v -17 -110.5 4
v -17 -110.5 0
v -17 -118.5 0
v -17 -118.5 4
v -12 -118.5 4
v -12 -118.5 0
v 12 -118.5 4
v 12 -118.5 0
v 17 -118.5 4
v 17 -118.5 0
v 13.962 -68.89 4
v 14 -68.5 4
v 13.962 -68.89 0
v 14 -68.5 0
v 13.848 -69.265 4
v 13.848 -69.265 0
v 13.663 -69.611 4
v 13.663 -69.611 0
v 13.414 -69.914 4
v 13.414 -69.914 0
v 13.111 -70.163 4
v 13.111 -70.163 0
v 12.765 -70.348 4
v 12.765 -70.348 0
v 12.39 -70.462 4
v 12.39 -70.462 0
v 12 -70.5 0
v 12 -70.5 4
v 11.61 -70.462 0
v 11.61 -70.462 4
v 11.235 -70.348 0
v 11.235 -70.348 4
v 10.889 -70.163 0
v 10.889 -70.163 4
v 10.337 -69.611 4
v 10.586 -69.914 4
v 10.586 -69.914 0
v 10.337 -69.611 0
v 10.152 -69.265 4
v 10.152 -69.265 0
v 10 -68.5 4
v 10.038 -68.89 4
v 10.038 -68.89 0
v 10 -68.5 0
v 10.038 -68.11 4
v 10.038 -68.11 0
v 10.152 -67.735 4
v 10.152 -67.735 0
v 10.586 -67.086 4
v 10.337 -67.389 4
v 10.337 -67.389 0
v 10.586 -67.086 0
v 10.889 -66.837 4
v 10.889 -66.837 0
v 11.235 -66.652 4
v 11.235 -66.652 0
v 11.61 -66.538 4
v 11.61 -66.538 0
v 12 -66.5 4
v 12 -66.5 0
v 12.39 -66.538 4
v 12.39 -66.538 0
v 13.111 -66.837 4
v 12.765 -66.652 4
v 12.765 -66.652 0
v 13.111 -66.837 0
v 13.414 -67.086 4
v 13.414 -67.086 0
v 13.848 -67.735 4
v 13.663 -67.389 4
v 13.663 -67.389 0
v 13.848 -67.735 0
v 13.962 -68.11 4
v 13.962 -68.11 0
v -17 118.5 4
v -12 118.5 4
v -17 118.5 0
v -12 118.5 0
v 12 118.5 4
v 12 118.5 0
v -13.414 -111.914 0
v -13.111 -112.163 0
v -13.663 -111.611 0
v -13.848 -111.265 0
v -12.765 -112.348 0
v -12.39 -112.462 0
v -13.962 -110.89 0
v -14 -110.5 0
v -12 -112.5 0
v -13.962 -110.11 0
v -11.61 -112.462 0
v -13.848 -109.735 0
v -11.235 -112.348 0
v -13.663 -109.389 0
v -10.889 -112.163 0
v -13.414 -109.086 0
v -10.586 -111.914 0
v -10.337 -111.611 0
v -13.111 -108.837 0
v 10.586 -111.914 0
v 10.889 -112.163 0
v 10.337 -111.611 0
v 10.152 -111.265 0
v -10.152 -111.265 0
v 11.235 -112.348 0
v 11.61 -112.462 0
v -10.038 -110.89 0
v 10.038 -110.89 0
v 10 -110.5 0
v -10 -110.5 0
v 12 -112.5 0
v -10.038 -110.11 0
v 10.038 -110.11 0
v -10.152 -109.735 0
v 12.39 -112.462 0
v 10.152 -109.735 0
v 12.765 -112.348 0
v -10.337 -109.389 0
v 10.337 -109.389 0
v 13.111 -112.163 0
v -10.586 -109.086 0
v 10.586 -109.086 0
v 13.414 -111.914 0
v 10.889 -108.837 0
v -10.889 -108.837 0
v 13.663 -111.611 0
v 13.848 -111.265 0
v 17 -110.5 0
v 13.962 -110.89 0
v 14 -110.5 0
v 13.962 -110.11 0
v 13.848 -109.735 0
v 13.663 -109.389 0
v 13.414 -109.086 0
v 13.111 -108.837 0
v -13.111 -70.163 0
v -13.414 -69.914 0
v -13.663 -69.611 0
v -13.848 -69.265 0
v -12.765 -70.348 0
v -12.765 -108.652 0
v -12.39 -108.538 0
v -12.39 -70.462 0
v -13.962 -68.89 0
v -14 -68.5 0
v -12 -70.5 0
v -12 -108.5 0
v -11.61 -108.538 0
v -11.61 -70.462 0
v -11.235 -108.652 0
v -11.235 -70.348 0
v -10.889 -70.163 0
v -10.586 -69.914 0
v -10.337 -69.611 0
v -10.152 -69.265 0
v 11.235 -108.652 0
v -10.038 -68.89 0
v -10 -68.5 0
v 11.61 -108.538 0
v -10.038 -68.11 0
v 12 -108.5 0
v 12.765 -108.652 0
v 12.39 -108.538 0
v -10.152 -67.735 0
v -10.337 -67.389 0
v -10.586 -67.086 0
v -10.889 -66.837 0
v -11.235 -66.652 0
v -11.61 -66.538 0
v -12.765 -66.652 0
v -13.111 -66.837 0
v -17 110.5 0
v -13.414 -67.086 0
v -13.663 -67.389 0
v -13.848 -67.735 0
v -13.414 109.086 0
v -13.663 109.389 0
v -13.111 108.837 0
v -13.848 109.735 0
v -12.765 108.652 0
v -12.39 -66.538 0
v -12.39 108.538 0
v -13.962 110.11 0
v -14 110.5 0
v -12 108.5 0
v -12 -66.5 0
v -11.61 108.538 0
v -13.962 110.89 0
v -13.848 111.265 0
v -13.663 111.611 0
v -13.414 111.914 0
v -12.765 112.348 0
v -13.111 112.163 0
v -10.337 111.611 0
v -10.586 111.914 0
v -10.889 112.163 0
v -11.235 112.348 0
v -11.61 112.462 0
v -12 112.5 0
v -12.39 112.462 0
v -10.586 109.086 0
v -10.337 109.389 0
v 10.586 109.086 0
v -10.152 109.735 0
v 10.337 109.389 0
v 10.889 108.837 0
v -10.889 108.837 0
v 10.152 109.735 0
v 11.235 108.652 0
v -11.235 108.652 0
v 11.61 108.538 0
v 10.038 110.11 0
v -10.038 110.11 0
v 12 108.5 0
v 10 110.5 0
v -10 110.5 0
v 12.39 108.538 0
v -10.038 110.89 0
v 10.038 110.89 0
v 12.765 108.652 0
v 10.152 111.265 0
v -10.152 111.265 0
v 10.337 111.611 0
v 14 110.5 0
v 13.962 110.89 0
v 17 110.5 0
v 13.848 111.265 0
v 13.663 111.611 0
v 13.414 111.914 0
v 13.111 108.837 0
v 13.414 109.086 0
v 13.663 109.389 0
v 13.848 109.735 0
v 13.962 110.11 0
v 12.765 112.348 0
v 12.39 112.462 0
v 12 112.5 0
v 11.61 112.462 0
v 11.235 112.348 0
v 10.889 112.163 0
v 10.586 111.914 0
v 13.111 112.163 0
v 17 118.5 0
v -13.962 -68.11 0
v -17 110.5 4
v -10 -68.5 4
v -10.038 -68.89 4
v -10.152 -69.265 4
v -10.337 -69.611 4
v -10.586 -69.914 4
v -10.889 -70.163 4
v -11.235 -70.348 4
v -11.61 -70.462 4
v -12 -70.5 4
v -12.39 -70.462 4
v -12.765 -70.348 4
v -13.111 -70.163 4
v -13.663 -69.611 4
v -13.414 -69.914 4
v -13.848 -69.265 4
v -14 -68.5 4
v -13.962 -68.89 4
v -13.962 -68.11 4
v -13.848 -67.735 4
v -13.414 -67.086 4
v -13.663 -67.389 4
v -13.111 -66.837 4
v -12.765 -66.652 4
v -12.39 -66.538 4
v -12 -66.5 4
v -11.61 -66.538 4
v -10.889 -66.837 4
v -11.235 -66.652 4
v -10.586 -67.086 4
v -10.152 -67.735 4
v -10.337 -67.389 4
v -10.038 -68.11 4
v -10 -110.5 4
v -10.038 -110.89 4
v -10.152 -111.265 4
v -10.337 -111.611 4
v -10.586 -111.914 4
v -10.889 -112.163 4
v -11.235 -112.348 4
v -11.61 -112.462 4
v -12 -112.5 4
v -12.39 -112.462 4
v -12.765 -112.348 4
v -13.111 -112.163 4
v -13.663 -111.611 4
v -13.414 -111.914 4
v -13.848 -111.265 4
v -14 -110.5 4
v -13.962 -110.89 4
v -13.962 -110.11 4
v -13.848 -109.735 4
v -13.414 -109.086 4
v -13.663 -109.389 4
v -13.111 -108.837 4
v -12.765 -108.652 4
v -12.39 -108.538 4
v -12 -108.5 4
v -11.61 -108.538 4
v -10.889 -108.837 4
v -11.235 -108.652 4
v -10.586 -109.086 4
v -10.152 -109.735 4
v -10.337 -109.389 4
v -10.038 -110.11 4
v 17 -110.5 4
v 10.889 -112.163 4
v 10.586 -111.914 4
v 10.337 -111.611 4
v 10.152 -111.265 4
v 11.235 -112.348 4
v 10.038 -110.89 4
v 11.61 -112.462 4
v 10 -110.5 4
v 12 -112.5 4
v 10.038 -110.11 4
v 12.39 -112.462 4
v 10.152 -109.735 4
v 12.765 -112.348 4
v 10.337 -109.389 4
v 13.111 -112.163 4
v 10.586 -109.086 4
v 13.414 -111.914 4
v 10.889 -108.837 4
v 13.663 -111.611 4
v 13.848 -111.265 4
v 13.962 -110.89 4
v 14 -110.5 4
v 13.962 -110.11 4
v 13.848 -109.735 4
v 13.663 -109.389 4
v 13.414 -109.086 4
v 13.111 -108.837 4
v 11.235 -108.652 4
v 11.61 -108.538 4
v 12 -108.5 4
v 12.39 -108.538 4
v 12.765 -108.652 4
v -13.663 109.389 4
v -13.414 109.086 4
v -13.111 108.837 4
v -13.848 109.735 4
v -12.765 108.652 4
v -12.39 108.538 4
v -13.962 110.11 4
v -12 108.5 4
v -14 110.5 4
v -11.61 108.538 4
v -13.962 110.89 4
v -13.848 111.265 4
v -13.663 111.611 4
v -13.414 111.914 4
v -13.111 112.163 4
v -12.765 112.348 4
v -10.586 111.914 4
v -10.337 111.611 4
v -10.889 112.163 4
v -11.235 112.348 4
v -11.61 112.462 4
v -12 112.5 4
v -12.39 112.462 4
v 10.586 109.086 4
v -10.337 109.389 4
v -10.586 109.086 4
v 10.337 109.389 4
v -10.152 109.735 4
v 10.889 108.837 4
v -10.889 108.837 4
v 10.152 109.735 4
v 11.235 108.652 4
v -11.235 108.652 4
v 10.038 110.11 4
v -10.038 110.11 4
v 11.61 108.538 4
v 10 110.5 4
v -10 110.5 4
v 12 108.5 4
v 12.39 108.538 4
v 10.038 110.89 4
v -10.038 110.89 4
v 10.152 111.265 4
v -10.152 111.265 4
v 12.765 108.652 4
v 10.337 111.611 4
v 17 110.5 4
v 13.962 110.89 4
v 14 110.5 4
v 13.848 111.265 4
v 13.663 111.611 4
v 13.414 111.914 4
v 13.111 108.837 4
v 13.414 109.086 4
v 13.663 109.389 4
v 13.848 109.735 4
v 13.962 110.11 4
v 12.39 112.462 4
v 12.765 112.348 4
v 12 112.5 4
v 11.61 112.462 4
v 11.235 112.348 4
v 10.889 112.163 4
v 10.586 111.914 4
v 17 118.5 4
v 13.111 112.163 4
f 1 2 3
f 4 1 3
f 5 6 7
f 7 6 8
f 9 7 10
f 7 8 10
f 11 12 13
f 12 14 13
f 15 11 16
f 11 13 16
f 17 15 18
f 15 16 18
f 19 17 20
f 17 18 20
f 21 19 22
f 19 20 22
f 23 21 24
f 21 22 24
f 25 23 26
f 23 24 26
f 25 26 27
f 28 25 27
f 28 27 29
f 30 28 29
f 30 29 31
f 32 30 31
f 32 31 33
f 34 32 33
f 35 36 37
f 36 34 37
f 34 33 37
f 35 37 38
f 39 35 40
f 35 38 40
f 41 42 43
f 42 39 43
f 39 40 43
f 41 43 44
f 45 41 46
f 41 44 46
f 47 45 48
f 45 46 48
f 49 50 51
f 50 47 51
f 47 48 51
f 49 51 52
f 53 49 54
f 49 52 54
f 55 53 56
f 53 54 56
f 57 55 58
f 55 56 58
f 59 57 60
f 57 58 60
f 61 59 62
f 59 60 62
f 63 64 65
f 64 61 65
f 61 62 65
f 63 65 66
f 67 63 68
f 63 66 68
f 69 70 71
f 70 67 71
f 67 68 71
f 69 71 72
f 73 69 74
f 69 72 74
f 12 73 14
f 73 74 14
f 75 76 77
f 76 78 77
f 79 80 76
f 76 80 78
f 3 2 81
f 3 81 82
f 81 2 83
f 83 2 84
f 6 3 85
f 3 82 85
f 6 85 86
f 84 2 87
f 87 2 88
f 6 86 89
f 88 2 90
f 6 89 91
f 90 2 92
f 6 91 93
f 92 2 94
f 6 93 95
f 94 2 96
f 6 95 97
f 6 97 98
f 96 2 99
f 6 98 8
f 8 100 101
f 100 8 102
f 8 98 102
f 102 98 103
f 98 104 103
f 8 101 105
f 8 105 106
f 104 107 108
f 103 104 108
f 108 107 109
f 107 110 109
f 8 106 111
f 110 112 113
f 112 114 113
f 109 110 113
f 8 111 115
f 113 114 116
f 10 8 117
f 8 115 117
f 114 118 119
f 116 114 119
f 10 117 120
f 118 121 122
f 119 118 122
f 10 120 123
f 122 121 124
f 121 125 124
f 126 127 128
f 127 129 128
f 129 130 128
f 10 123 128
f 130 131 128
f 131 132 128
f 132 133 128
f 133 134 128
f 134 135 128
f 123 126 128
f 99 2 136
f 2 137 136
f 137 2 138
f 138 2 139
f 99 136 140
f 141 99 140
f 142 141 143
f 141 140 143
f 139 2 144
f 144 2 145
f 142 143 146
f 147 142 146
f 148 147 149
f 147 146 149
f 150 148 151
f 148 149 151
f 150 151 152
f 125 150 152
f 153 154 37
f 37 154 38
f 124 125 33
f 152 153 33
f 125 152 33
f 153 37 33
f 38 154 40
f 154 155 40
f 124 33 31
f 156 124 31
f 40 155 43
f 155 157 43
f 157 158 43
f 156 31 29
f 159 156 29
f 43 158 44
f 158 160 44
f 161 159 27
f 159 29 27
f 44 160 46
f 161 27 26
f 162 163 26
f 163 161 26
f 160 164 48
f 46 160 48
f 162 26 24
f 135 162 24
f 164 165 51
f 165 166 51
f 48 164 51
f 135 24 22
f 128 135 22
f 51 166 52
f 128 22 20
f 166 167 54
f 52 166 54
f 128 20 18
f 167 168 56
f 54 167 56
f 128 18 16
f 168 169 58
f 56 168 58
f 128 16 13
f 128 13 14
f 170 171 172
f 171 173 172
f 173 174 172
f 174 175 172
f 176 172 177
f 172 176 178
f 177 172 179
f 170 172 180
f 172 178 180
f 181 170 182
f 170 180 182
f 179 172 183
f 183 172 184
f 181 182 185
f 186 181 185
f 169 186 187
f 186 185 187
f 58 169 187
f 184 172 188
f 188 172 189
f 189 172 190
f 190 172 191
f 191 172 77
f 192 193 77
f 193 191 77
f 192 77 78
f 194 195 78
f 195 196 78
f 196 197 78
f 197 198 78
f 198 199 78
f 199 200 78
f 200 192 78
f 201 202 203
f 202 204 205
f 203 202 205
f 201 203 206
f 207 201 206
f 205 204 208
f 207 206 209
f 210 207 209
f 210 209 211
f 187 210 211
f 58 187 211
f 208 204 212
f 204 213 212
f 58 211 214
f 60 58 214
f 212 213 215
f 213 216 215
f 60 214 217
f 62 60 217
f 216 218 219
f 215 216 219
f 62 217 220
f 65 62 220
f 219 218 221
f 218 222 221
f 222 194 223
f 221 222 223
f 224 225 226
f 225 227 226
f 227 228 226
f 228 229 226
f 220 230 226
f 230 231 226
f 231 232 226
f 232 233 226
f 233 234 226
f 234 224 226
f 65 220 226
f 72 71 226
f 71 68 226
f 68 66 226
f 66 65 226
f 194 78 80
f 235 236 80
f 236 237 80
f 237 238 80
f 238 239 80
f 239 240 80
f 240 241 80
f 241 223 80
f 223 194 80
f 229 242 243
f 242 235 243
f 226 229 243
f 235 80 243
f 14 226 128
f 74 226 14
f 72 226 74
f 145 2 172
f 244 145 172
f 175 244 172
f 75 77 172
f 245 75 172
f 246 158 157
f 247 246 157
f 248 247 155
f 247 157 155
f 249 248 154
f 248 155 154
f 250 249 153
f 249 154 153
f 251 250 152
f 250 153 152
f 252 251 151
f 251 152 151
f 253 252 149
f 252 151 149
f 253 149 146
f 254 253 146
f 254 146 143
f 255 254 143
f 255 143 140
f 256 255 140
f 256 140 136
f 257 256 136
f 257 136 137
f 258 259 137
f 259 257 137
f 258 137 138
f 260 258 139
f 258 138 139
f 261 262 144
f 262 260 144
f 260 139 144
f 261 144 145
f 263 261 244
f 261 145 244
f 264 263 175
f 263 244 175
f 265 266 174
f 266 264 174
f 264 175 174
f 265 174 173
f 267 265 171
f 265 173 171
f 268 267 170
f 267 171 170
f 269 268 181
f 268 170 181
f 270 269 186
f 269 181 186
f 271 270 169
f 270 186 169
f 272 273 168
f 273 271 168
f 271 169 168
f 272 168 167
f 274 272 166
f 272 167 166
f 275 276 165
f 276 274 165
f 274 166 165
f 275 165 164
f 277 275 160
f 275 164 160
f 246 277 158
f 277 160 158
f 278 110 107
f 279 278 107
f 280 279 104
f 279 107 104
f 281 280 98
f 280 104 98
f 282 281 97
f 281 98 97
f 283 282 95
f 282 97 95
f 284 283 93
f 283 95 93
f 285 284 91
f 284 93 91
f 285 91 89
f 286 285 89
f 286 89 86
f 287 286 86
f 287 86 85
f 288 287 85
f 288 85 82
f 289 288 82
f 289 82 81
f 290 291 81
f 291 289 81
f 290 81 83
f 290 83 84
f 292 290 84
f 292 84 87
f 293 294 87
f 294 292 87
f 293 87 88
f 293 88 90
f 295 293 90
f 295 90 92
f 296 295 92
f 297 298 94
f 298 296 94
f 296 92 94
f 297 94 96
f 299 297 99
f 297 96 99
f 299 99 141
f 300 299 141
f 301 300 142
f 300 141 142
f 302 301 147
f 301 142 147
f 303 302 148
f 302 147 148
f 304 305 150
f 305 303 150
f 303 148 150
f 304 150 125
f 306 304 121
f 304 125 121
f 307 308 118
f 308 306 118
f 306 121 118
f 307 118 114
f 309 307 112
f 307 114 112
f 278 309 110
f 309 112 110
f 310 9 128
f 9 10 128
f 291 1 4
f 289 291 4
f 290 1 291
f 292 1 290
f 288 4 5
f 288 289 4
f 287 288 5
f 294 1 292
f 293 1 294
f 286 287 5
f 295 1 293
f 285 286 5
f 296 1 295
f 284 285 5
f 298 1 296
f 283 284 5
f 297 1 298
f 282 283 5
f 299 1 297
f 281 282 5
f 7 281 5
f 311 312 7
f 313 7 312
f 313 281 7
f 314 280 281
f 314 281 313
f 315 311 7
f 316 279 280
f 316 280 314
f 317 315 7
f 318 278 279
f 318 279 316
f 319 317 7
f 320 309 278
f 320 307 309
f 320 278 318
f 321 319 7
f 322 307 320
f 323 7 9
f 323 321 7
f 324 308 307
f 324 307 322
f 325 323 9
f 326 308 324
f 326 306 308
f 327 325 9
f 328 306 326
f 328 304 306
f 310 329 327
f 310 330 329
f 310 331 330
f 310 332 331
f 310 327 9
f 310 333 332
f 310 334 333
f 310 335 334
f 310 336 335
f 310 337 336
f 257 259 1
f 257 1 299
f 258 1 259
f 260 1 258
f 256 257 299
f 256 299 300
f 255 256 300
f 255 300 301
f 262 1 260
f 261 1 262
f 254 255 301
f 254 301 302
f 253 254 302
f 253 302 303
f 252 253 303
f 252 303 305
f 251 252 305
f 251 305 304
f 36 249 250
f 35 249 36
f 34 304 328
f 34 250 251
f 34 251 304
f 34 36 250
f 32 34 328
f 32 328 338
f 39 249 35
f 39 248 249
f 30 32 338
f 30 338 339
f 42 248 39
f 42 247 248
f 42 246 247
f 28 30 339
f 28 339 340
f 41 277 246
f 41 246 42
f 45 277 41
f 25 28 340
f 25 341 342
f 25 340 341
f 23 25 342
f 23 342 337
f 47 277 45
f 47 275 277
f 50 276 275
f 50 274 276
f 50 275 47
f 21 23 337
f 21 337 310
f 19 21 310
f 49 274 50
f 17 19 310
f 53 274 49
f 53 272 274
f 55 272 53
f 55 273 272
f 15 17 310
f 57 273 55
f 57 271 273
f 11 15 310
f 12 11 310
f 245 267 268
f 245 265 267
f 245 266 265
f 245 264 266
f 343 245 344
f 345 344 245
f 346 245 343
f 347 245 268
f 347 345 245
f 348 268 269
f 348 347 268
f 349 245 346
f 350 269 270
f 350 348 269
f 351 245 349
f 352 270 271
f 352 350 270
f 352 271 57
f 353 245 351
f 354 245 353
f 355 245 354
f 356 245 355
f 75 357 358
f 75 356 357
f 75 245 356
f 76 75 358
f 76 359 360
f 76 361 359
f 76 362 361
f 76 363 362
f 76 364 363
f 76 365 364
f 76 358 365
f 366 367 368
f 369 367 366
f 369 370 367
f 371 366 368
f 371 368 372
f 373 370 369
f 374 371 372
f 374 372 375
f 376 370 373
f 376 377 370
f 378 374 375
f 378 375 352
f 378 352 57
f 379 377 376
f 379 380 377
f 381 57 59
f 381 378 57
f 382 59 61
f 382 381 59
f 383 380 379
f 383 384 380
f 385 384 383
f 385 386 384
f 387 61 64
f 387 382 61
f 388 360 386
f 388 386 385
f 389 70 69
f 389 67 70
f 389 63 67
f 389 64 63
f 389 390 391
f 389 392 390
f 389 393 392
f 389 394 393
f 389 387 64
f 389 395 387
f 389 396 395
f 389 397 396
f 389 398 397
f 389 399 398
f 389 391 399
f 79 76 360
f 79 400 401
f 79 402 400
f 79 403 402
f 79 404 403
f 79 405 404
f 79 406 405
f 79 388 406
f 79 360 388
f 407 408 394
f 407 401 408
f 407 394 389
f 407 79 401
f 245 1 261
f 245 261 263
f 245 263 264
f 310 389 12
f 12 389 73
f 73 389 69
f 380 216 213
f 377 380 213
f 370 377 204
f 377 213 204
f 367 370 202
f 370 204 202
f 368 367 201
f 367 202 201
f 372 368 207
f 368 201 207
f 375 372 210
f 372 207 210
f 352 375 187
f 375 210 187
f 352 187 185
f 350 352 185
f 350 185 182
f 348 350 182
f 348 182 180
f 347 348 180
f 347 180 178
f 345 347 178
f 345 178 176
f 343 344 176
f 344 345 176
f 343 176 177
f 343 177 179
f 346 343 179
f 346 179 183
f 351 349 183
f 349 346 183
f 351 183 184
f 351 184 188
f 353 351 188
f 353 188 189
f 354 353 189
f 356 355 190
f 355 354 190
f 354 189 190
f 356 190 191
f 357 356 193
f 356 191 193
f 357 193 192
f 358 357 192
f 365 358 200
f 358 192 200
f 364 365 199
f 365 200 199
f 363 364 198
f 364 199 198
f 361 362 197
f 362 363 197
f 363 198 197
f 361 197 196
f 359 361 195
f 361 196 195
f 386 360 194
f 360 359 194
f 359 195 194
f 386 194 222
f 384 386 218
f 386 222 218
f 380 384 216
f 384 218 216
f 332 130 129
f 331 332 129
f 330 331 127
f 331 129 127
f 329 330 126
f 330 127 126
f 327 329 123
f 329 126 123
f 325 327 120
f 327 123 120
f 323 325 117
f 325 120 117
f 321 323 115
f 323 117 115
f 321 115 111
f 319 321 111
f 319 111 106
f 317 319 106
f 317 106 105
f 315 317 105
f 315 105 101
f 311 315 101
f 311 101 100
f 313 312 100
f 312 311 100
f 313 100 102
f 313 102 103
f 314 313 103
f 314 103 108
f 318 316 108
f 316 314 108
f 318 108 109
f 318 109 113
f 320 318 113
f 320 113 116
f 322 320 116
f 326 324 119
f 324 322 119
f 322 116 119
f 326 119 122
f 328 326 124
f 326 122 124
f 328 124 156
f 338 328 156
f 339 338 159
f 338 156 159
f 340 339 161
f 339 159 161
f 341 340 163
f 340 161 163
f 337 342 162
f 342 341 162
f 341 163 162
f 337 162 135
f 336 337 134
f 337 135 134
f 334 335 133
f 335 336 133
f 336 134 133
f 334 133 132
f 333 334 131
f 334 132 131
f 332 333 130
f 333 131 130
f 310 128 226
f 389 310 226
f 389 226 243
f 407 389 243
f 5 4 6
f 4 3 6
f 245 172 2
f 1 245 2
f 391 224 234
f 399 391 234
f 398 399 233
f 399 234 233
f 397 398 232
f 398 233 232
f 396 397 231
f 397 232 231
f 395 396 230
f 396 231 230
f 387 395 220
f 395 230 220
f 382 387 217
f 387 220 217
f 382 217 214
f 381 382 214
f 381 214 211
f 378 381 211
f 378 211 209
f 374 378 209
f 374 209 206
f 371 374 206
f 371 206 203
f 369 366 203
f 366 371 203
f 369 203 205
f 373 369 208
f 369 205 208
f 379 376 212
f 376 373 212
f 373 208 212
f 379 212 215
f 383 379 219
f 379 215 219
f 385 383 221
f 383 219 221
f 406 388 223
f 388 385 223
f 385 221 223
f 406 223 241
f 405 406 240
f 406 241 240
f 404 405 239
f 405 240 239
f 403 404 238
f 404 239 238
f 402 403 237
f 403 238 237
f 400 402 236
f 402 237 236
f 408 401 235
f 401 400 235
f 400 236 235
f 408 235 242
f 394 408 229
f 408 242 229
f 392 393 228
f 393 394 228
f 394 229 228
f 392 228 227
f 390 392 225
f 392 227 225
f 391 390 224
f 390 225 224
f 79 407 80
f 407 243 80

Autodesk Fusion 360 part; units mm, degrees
sketch "Sketch1" plane through (0, 0, 0) normal (0, 0, 1) x (1, 0, 0)
  line L0 (17, 118.5) -> (-17, 118.5)
  line L1 (-17, 118.5) -> (-17, -118.5)
  line L2 (-17, -118.5) -> (17, -118.5)
  line L3 (17, -118.5) -> (17, 118.5)
  line L4 (17, 118.5) -> (12, 118.5)
  line L5 (12, 118.5) -> (12, 110.5) construction
  line L6 (12, 110.5) -> (17, 110.5) construction
  line L7 (17, 110.5) -> (17, 118.5)
  line L8 (-17, 118.5) -> (-12, 118.5)
  line L9 (-12, 118.5) -> (-12, 110.5) construction
  line L10 (-12, 110.5) -> (-17, 110.5) construction
  line L11 (-17, 110.5) -> (-17, 118.5)
  line L12 (-17, -118.5) -> (-12, -118.5)
  line L13 (-12, -118.5) -> (-12, -110.5) construction
  line L14 (-12, -110.5) -> (-17, -110.5) construction
  line L15 (-17, -110.5) -> (-17, -118.5)
  line L16 (17, -118.5) -> (12, -118.5)
  line L17 (12, -118.5) -> (12, -110.5) construction
  line L18 (12, -110.5) -> (17, -110.5) construction
  line L19 (17, -110.5) -> (17, -118.5)
  line L20 (12, 110.5) -> (12, 68.5) construction
  line L21 (-12, 110.5) -> (-12, 68.5) construction
  line L22 (12, -110.5) -> (12, -68.5) construction
  line L23 (-12, -110.5) -> (-12, -68.5) construction
  circle A0 centre (-12, -68.5) radius 2
  circle A1 centre (12, -68.5) radius 2
  circle A2 centre (12, -110.5) radius 2
  circle A3 centre (-12, -110.5) radius 2
  circle A4 centre (-12, 110.5) radius 2
  circle A5 centre (12, 110.5) radius 2
  dimension "d3" = 34
  dimension "d4" = 237
  dimension "d5" = 5
  dimension "d6" = 8
  dimension "d7" = 5
  dimension "d8" = 8
  dimension "d9" = 5
  dimension "d10" = 8
  dimension "d11" = 5
  dimension "d12" = 8
  dimension "d13" = 42
  dimension "d14" = 42
  dimension "d15" = 42
  dimension "d16" = 42
  dimension "d17" = 4
  dimension "d18" = 4
  dimension "d19" = 4
  dimension "d20" = 4
  dimension "d21" = 4
  dimension "d22" = 4
extrude "Extrude1" add sketch "Sketch1" along normal blind 4
